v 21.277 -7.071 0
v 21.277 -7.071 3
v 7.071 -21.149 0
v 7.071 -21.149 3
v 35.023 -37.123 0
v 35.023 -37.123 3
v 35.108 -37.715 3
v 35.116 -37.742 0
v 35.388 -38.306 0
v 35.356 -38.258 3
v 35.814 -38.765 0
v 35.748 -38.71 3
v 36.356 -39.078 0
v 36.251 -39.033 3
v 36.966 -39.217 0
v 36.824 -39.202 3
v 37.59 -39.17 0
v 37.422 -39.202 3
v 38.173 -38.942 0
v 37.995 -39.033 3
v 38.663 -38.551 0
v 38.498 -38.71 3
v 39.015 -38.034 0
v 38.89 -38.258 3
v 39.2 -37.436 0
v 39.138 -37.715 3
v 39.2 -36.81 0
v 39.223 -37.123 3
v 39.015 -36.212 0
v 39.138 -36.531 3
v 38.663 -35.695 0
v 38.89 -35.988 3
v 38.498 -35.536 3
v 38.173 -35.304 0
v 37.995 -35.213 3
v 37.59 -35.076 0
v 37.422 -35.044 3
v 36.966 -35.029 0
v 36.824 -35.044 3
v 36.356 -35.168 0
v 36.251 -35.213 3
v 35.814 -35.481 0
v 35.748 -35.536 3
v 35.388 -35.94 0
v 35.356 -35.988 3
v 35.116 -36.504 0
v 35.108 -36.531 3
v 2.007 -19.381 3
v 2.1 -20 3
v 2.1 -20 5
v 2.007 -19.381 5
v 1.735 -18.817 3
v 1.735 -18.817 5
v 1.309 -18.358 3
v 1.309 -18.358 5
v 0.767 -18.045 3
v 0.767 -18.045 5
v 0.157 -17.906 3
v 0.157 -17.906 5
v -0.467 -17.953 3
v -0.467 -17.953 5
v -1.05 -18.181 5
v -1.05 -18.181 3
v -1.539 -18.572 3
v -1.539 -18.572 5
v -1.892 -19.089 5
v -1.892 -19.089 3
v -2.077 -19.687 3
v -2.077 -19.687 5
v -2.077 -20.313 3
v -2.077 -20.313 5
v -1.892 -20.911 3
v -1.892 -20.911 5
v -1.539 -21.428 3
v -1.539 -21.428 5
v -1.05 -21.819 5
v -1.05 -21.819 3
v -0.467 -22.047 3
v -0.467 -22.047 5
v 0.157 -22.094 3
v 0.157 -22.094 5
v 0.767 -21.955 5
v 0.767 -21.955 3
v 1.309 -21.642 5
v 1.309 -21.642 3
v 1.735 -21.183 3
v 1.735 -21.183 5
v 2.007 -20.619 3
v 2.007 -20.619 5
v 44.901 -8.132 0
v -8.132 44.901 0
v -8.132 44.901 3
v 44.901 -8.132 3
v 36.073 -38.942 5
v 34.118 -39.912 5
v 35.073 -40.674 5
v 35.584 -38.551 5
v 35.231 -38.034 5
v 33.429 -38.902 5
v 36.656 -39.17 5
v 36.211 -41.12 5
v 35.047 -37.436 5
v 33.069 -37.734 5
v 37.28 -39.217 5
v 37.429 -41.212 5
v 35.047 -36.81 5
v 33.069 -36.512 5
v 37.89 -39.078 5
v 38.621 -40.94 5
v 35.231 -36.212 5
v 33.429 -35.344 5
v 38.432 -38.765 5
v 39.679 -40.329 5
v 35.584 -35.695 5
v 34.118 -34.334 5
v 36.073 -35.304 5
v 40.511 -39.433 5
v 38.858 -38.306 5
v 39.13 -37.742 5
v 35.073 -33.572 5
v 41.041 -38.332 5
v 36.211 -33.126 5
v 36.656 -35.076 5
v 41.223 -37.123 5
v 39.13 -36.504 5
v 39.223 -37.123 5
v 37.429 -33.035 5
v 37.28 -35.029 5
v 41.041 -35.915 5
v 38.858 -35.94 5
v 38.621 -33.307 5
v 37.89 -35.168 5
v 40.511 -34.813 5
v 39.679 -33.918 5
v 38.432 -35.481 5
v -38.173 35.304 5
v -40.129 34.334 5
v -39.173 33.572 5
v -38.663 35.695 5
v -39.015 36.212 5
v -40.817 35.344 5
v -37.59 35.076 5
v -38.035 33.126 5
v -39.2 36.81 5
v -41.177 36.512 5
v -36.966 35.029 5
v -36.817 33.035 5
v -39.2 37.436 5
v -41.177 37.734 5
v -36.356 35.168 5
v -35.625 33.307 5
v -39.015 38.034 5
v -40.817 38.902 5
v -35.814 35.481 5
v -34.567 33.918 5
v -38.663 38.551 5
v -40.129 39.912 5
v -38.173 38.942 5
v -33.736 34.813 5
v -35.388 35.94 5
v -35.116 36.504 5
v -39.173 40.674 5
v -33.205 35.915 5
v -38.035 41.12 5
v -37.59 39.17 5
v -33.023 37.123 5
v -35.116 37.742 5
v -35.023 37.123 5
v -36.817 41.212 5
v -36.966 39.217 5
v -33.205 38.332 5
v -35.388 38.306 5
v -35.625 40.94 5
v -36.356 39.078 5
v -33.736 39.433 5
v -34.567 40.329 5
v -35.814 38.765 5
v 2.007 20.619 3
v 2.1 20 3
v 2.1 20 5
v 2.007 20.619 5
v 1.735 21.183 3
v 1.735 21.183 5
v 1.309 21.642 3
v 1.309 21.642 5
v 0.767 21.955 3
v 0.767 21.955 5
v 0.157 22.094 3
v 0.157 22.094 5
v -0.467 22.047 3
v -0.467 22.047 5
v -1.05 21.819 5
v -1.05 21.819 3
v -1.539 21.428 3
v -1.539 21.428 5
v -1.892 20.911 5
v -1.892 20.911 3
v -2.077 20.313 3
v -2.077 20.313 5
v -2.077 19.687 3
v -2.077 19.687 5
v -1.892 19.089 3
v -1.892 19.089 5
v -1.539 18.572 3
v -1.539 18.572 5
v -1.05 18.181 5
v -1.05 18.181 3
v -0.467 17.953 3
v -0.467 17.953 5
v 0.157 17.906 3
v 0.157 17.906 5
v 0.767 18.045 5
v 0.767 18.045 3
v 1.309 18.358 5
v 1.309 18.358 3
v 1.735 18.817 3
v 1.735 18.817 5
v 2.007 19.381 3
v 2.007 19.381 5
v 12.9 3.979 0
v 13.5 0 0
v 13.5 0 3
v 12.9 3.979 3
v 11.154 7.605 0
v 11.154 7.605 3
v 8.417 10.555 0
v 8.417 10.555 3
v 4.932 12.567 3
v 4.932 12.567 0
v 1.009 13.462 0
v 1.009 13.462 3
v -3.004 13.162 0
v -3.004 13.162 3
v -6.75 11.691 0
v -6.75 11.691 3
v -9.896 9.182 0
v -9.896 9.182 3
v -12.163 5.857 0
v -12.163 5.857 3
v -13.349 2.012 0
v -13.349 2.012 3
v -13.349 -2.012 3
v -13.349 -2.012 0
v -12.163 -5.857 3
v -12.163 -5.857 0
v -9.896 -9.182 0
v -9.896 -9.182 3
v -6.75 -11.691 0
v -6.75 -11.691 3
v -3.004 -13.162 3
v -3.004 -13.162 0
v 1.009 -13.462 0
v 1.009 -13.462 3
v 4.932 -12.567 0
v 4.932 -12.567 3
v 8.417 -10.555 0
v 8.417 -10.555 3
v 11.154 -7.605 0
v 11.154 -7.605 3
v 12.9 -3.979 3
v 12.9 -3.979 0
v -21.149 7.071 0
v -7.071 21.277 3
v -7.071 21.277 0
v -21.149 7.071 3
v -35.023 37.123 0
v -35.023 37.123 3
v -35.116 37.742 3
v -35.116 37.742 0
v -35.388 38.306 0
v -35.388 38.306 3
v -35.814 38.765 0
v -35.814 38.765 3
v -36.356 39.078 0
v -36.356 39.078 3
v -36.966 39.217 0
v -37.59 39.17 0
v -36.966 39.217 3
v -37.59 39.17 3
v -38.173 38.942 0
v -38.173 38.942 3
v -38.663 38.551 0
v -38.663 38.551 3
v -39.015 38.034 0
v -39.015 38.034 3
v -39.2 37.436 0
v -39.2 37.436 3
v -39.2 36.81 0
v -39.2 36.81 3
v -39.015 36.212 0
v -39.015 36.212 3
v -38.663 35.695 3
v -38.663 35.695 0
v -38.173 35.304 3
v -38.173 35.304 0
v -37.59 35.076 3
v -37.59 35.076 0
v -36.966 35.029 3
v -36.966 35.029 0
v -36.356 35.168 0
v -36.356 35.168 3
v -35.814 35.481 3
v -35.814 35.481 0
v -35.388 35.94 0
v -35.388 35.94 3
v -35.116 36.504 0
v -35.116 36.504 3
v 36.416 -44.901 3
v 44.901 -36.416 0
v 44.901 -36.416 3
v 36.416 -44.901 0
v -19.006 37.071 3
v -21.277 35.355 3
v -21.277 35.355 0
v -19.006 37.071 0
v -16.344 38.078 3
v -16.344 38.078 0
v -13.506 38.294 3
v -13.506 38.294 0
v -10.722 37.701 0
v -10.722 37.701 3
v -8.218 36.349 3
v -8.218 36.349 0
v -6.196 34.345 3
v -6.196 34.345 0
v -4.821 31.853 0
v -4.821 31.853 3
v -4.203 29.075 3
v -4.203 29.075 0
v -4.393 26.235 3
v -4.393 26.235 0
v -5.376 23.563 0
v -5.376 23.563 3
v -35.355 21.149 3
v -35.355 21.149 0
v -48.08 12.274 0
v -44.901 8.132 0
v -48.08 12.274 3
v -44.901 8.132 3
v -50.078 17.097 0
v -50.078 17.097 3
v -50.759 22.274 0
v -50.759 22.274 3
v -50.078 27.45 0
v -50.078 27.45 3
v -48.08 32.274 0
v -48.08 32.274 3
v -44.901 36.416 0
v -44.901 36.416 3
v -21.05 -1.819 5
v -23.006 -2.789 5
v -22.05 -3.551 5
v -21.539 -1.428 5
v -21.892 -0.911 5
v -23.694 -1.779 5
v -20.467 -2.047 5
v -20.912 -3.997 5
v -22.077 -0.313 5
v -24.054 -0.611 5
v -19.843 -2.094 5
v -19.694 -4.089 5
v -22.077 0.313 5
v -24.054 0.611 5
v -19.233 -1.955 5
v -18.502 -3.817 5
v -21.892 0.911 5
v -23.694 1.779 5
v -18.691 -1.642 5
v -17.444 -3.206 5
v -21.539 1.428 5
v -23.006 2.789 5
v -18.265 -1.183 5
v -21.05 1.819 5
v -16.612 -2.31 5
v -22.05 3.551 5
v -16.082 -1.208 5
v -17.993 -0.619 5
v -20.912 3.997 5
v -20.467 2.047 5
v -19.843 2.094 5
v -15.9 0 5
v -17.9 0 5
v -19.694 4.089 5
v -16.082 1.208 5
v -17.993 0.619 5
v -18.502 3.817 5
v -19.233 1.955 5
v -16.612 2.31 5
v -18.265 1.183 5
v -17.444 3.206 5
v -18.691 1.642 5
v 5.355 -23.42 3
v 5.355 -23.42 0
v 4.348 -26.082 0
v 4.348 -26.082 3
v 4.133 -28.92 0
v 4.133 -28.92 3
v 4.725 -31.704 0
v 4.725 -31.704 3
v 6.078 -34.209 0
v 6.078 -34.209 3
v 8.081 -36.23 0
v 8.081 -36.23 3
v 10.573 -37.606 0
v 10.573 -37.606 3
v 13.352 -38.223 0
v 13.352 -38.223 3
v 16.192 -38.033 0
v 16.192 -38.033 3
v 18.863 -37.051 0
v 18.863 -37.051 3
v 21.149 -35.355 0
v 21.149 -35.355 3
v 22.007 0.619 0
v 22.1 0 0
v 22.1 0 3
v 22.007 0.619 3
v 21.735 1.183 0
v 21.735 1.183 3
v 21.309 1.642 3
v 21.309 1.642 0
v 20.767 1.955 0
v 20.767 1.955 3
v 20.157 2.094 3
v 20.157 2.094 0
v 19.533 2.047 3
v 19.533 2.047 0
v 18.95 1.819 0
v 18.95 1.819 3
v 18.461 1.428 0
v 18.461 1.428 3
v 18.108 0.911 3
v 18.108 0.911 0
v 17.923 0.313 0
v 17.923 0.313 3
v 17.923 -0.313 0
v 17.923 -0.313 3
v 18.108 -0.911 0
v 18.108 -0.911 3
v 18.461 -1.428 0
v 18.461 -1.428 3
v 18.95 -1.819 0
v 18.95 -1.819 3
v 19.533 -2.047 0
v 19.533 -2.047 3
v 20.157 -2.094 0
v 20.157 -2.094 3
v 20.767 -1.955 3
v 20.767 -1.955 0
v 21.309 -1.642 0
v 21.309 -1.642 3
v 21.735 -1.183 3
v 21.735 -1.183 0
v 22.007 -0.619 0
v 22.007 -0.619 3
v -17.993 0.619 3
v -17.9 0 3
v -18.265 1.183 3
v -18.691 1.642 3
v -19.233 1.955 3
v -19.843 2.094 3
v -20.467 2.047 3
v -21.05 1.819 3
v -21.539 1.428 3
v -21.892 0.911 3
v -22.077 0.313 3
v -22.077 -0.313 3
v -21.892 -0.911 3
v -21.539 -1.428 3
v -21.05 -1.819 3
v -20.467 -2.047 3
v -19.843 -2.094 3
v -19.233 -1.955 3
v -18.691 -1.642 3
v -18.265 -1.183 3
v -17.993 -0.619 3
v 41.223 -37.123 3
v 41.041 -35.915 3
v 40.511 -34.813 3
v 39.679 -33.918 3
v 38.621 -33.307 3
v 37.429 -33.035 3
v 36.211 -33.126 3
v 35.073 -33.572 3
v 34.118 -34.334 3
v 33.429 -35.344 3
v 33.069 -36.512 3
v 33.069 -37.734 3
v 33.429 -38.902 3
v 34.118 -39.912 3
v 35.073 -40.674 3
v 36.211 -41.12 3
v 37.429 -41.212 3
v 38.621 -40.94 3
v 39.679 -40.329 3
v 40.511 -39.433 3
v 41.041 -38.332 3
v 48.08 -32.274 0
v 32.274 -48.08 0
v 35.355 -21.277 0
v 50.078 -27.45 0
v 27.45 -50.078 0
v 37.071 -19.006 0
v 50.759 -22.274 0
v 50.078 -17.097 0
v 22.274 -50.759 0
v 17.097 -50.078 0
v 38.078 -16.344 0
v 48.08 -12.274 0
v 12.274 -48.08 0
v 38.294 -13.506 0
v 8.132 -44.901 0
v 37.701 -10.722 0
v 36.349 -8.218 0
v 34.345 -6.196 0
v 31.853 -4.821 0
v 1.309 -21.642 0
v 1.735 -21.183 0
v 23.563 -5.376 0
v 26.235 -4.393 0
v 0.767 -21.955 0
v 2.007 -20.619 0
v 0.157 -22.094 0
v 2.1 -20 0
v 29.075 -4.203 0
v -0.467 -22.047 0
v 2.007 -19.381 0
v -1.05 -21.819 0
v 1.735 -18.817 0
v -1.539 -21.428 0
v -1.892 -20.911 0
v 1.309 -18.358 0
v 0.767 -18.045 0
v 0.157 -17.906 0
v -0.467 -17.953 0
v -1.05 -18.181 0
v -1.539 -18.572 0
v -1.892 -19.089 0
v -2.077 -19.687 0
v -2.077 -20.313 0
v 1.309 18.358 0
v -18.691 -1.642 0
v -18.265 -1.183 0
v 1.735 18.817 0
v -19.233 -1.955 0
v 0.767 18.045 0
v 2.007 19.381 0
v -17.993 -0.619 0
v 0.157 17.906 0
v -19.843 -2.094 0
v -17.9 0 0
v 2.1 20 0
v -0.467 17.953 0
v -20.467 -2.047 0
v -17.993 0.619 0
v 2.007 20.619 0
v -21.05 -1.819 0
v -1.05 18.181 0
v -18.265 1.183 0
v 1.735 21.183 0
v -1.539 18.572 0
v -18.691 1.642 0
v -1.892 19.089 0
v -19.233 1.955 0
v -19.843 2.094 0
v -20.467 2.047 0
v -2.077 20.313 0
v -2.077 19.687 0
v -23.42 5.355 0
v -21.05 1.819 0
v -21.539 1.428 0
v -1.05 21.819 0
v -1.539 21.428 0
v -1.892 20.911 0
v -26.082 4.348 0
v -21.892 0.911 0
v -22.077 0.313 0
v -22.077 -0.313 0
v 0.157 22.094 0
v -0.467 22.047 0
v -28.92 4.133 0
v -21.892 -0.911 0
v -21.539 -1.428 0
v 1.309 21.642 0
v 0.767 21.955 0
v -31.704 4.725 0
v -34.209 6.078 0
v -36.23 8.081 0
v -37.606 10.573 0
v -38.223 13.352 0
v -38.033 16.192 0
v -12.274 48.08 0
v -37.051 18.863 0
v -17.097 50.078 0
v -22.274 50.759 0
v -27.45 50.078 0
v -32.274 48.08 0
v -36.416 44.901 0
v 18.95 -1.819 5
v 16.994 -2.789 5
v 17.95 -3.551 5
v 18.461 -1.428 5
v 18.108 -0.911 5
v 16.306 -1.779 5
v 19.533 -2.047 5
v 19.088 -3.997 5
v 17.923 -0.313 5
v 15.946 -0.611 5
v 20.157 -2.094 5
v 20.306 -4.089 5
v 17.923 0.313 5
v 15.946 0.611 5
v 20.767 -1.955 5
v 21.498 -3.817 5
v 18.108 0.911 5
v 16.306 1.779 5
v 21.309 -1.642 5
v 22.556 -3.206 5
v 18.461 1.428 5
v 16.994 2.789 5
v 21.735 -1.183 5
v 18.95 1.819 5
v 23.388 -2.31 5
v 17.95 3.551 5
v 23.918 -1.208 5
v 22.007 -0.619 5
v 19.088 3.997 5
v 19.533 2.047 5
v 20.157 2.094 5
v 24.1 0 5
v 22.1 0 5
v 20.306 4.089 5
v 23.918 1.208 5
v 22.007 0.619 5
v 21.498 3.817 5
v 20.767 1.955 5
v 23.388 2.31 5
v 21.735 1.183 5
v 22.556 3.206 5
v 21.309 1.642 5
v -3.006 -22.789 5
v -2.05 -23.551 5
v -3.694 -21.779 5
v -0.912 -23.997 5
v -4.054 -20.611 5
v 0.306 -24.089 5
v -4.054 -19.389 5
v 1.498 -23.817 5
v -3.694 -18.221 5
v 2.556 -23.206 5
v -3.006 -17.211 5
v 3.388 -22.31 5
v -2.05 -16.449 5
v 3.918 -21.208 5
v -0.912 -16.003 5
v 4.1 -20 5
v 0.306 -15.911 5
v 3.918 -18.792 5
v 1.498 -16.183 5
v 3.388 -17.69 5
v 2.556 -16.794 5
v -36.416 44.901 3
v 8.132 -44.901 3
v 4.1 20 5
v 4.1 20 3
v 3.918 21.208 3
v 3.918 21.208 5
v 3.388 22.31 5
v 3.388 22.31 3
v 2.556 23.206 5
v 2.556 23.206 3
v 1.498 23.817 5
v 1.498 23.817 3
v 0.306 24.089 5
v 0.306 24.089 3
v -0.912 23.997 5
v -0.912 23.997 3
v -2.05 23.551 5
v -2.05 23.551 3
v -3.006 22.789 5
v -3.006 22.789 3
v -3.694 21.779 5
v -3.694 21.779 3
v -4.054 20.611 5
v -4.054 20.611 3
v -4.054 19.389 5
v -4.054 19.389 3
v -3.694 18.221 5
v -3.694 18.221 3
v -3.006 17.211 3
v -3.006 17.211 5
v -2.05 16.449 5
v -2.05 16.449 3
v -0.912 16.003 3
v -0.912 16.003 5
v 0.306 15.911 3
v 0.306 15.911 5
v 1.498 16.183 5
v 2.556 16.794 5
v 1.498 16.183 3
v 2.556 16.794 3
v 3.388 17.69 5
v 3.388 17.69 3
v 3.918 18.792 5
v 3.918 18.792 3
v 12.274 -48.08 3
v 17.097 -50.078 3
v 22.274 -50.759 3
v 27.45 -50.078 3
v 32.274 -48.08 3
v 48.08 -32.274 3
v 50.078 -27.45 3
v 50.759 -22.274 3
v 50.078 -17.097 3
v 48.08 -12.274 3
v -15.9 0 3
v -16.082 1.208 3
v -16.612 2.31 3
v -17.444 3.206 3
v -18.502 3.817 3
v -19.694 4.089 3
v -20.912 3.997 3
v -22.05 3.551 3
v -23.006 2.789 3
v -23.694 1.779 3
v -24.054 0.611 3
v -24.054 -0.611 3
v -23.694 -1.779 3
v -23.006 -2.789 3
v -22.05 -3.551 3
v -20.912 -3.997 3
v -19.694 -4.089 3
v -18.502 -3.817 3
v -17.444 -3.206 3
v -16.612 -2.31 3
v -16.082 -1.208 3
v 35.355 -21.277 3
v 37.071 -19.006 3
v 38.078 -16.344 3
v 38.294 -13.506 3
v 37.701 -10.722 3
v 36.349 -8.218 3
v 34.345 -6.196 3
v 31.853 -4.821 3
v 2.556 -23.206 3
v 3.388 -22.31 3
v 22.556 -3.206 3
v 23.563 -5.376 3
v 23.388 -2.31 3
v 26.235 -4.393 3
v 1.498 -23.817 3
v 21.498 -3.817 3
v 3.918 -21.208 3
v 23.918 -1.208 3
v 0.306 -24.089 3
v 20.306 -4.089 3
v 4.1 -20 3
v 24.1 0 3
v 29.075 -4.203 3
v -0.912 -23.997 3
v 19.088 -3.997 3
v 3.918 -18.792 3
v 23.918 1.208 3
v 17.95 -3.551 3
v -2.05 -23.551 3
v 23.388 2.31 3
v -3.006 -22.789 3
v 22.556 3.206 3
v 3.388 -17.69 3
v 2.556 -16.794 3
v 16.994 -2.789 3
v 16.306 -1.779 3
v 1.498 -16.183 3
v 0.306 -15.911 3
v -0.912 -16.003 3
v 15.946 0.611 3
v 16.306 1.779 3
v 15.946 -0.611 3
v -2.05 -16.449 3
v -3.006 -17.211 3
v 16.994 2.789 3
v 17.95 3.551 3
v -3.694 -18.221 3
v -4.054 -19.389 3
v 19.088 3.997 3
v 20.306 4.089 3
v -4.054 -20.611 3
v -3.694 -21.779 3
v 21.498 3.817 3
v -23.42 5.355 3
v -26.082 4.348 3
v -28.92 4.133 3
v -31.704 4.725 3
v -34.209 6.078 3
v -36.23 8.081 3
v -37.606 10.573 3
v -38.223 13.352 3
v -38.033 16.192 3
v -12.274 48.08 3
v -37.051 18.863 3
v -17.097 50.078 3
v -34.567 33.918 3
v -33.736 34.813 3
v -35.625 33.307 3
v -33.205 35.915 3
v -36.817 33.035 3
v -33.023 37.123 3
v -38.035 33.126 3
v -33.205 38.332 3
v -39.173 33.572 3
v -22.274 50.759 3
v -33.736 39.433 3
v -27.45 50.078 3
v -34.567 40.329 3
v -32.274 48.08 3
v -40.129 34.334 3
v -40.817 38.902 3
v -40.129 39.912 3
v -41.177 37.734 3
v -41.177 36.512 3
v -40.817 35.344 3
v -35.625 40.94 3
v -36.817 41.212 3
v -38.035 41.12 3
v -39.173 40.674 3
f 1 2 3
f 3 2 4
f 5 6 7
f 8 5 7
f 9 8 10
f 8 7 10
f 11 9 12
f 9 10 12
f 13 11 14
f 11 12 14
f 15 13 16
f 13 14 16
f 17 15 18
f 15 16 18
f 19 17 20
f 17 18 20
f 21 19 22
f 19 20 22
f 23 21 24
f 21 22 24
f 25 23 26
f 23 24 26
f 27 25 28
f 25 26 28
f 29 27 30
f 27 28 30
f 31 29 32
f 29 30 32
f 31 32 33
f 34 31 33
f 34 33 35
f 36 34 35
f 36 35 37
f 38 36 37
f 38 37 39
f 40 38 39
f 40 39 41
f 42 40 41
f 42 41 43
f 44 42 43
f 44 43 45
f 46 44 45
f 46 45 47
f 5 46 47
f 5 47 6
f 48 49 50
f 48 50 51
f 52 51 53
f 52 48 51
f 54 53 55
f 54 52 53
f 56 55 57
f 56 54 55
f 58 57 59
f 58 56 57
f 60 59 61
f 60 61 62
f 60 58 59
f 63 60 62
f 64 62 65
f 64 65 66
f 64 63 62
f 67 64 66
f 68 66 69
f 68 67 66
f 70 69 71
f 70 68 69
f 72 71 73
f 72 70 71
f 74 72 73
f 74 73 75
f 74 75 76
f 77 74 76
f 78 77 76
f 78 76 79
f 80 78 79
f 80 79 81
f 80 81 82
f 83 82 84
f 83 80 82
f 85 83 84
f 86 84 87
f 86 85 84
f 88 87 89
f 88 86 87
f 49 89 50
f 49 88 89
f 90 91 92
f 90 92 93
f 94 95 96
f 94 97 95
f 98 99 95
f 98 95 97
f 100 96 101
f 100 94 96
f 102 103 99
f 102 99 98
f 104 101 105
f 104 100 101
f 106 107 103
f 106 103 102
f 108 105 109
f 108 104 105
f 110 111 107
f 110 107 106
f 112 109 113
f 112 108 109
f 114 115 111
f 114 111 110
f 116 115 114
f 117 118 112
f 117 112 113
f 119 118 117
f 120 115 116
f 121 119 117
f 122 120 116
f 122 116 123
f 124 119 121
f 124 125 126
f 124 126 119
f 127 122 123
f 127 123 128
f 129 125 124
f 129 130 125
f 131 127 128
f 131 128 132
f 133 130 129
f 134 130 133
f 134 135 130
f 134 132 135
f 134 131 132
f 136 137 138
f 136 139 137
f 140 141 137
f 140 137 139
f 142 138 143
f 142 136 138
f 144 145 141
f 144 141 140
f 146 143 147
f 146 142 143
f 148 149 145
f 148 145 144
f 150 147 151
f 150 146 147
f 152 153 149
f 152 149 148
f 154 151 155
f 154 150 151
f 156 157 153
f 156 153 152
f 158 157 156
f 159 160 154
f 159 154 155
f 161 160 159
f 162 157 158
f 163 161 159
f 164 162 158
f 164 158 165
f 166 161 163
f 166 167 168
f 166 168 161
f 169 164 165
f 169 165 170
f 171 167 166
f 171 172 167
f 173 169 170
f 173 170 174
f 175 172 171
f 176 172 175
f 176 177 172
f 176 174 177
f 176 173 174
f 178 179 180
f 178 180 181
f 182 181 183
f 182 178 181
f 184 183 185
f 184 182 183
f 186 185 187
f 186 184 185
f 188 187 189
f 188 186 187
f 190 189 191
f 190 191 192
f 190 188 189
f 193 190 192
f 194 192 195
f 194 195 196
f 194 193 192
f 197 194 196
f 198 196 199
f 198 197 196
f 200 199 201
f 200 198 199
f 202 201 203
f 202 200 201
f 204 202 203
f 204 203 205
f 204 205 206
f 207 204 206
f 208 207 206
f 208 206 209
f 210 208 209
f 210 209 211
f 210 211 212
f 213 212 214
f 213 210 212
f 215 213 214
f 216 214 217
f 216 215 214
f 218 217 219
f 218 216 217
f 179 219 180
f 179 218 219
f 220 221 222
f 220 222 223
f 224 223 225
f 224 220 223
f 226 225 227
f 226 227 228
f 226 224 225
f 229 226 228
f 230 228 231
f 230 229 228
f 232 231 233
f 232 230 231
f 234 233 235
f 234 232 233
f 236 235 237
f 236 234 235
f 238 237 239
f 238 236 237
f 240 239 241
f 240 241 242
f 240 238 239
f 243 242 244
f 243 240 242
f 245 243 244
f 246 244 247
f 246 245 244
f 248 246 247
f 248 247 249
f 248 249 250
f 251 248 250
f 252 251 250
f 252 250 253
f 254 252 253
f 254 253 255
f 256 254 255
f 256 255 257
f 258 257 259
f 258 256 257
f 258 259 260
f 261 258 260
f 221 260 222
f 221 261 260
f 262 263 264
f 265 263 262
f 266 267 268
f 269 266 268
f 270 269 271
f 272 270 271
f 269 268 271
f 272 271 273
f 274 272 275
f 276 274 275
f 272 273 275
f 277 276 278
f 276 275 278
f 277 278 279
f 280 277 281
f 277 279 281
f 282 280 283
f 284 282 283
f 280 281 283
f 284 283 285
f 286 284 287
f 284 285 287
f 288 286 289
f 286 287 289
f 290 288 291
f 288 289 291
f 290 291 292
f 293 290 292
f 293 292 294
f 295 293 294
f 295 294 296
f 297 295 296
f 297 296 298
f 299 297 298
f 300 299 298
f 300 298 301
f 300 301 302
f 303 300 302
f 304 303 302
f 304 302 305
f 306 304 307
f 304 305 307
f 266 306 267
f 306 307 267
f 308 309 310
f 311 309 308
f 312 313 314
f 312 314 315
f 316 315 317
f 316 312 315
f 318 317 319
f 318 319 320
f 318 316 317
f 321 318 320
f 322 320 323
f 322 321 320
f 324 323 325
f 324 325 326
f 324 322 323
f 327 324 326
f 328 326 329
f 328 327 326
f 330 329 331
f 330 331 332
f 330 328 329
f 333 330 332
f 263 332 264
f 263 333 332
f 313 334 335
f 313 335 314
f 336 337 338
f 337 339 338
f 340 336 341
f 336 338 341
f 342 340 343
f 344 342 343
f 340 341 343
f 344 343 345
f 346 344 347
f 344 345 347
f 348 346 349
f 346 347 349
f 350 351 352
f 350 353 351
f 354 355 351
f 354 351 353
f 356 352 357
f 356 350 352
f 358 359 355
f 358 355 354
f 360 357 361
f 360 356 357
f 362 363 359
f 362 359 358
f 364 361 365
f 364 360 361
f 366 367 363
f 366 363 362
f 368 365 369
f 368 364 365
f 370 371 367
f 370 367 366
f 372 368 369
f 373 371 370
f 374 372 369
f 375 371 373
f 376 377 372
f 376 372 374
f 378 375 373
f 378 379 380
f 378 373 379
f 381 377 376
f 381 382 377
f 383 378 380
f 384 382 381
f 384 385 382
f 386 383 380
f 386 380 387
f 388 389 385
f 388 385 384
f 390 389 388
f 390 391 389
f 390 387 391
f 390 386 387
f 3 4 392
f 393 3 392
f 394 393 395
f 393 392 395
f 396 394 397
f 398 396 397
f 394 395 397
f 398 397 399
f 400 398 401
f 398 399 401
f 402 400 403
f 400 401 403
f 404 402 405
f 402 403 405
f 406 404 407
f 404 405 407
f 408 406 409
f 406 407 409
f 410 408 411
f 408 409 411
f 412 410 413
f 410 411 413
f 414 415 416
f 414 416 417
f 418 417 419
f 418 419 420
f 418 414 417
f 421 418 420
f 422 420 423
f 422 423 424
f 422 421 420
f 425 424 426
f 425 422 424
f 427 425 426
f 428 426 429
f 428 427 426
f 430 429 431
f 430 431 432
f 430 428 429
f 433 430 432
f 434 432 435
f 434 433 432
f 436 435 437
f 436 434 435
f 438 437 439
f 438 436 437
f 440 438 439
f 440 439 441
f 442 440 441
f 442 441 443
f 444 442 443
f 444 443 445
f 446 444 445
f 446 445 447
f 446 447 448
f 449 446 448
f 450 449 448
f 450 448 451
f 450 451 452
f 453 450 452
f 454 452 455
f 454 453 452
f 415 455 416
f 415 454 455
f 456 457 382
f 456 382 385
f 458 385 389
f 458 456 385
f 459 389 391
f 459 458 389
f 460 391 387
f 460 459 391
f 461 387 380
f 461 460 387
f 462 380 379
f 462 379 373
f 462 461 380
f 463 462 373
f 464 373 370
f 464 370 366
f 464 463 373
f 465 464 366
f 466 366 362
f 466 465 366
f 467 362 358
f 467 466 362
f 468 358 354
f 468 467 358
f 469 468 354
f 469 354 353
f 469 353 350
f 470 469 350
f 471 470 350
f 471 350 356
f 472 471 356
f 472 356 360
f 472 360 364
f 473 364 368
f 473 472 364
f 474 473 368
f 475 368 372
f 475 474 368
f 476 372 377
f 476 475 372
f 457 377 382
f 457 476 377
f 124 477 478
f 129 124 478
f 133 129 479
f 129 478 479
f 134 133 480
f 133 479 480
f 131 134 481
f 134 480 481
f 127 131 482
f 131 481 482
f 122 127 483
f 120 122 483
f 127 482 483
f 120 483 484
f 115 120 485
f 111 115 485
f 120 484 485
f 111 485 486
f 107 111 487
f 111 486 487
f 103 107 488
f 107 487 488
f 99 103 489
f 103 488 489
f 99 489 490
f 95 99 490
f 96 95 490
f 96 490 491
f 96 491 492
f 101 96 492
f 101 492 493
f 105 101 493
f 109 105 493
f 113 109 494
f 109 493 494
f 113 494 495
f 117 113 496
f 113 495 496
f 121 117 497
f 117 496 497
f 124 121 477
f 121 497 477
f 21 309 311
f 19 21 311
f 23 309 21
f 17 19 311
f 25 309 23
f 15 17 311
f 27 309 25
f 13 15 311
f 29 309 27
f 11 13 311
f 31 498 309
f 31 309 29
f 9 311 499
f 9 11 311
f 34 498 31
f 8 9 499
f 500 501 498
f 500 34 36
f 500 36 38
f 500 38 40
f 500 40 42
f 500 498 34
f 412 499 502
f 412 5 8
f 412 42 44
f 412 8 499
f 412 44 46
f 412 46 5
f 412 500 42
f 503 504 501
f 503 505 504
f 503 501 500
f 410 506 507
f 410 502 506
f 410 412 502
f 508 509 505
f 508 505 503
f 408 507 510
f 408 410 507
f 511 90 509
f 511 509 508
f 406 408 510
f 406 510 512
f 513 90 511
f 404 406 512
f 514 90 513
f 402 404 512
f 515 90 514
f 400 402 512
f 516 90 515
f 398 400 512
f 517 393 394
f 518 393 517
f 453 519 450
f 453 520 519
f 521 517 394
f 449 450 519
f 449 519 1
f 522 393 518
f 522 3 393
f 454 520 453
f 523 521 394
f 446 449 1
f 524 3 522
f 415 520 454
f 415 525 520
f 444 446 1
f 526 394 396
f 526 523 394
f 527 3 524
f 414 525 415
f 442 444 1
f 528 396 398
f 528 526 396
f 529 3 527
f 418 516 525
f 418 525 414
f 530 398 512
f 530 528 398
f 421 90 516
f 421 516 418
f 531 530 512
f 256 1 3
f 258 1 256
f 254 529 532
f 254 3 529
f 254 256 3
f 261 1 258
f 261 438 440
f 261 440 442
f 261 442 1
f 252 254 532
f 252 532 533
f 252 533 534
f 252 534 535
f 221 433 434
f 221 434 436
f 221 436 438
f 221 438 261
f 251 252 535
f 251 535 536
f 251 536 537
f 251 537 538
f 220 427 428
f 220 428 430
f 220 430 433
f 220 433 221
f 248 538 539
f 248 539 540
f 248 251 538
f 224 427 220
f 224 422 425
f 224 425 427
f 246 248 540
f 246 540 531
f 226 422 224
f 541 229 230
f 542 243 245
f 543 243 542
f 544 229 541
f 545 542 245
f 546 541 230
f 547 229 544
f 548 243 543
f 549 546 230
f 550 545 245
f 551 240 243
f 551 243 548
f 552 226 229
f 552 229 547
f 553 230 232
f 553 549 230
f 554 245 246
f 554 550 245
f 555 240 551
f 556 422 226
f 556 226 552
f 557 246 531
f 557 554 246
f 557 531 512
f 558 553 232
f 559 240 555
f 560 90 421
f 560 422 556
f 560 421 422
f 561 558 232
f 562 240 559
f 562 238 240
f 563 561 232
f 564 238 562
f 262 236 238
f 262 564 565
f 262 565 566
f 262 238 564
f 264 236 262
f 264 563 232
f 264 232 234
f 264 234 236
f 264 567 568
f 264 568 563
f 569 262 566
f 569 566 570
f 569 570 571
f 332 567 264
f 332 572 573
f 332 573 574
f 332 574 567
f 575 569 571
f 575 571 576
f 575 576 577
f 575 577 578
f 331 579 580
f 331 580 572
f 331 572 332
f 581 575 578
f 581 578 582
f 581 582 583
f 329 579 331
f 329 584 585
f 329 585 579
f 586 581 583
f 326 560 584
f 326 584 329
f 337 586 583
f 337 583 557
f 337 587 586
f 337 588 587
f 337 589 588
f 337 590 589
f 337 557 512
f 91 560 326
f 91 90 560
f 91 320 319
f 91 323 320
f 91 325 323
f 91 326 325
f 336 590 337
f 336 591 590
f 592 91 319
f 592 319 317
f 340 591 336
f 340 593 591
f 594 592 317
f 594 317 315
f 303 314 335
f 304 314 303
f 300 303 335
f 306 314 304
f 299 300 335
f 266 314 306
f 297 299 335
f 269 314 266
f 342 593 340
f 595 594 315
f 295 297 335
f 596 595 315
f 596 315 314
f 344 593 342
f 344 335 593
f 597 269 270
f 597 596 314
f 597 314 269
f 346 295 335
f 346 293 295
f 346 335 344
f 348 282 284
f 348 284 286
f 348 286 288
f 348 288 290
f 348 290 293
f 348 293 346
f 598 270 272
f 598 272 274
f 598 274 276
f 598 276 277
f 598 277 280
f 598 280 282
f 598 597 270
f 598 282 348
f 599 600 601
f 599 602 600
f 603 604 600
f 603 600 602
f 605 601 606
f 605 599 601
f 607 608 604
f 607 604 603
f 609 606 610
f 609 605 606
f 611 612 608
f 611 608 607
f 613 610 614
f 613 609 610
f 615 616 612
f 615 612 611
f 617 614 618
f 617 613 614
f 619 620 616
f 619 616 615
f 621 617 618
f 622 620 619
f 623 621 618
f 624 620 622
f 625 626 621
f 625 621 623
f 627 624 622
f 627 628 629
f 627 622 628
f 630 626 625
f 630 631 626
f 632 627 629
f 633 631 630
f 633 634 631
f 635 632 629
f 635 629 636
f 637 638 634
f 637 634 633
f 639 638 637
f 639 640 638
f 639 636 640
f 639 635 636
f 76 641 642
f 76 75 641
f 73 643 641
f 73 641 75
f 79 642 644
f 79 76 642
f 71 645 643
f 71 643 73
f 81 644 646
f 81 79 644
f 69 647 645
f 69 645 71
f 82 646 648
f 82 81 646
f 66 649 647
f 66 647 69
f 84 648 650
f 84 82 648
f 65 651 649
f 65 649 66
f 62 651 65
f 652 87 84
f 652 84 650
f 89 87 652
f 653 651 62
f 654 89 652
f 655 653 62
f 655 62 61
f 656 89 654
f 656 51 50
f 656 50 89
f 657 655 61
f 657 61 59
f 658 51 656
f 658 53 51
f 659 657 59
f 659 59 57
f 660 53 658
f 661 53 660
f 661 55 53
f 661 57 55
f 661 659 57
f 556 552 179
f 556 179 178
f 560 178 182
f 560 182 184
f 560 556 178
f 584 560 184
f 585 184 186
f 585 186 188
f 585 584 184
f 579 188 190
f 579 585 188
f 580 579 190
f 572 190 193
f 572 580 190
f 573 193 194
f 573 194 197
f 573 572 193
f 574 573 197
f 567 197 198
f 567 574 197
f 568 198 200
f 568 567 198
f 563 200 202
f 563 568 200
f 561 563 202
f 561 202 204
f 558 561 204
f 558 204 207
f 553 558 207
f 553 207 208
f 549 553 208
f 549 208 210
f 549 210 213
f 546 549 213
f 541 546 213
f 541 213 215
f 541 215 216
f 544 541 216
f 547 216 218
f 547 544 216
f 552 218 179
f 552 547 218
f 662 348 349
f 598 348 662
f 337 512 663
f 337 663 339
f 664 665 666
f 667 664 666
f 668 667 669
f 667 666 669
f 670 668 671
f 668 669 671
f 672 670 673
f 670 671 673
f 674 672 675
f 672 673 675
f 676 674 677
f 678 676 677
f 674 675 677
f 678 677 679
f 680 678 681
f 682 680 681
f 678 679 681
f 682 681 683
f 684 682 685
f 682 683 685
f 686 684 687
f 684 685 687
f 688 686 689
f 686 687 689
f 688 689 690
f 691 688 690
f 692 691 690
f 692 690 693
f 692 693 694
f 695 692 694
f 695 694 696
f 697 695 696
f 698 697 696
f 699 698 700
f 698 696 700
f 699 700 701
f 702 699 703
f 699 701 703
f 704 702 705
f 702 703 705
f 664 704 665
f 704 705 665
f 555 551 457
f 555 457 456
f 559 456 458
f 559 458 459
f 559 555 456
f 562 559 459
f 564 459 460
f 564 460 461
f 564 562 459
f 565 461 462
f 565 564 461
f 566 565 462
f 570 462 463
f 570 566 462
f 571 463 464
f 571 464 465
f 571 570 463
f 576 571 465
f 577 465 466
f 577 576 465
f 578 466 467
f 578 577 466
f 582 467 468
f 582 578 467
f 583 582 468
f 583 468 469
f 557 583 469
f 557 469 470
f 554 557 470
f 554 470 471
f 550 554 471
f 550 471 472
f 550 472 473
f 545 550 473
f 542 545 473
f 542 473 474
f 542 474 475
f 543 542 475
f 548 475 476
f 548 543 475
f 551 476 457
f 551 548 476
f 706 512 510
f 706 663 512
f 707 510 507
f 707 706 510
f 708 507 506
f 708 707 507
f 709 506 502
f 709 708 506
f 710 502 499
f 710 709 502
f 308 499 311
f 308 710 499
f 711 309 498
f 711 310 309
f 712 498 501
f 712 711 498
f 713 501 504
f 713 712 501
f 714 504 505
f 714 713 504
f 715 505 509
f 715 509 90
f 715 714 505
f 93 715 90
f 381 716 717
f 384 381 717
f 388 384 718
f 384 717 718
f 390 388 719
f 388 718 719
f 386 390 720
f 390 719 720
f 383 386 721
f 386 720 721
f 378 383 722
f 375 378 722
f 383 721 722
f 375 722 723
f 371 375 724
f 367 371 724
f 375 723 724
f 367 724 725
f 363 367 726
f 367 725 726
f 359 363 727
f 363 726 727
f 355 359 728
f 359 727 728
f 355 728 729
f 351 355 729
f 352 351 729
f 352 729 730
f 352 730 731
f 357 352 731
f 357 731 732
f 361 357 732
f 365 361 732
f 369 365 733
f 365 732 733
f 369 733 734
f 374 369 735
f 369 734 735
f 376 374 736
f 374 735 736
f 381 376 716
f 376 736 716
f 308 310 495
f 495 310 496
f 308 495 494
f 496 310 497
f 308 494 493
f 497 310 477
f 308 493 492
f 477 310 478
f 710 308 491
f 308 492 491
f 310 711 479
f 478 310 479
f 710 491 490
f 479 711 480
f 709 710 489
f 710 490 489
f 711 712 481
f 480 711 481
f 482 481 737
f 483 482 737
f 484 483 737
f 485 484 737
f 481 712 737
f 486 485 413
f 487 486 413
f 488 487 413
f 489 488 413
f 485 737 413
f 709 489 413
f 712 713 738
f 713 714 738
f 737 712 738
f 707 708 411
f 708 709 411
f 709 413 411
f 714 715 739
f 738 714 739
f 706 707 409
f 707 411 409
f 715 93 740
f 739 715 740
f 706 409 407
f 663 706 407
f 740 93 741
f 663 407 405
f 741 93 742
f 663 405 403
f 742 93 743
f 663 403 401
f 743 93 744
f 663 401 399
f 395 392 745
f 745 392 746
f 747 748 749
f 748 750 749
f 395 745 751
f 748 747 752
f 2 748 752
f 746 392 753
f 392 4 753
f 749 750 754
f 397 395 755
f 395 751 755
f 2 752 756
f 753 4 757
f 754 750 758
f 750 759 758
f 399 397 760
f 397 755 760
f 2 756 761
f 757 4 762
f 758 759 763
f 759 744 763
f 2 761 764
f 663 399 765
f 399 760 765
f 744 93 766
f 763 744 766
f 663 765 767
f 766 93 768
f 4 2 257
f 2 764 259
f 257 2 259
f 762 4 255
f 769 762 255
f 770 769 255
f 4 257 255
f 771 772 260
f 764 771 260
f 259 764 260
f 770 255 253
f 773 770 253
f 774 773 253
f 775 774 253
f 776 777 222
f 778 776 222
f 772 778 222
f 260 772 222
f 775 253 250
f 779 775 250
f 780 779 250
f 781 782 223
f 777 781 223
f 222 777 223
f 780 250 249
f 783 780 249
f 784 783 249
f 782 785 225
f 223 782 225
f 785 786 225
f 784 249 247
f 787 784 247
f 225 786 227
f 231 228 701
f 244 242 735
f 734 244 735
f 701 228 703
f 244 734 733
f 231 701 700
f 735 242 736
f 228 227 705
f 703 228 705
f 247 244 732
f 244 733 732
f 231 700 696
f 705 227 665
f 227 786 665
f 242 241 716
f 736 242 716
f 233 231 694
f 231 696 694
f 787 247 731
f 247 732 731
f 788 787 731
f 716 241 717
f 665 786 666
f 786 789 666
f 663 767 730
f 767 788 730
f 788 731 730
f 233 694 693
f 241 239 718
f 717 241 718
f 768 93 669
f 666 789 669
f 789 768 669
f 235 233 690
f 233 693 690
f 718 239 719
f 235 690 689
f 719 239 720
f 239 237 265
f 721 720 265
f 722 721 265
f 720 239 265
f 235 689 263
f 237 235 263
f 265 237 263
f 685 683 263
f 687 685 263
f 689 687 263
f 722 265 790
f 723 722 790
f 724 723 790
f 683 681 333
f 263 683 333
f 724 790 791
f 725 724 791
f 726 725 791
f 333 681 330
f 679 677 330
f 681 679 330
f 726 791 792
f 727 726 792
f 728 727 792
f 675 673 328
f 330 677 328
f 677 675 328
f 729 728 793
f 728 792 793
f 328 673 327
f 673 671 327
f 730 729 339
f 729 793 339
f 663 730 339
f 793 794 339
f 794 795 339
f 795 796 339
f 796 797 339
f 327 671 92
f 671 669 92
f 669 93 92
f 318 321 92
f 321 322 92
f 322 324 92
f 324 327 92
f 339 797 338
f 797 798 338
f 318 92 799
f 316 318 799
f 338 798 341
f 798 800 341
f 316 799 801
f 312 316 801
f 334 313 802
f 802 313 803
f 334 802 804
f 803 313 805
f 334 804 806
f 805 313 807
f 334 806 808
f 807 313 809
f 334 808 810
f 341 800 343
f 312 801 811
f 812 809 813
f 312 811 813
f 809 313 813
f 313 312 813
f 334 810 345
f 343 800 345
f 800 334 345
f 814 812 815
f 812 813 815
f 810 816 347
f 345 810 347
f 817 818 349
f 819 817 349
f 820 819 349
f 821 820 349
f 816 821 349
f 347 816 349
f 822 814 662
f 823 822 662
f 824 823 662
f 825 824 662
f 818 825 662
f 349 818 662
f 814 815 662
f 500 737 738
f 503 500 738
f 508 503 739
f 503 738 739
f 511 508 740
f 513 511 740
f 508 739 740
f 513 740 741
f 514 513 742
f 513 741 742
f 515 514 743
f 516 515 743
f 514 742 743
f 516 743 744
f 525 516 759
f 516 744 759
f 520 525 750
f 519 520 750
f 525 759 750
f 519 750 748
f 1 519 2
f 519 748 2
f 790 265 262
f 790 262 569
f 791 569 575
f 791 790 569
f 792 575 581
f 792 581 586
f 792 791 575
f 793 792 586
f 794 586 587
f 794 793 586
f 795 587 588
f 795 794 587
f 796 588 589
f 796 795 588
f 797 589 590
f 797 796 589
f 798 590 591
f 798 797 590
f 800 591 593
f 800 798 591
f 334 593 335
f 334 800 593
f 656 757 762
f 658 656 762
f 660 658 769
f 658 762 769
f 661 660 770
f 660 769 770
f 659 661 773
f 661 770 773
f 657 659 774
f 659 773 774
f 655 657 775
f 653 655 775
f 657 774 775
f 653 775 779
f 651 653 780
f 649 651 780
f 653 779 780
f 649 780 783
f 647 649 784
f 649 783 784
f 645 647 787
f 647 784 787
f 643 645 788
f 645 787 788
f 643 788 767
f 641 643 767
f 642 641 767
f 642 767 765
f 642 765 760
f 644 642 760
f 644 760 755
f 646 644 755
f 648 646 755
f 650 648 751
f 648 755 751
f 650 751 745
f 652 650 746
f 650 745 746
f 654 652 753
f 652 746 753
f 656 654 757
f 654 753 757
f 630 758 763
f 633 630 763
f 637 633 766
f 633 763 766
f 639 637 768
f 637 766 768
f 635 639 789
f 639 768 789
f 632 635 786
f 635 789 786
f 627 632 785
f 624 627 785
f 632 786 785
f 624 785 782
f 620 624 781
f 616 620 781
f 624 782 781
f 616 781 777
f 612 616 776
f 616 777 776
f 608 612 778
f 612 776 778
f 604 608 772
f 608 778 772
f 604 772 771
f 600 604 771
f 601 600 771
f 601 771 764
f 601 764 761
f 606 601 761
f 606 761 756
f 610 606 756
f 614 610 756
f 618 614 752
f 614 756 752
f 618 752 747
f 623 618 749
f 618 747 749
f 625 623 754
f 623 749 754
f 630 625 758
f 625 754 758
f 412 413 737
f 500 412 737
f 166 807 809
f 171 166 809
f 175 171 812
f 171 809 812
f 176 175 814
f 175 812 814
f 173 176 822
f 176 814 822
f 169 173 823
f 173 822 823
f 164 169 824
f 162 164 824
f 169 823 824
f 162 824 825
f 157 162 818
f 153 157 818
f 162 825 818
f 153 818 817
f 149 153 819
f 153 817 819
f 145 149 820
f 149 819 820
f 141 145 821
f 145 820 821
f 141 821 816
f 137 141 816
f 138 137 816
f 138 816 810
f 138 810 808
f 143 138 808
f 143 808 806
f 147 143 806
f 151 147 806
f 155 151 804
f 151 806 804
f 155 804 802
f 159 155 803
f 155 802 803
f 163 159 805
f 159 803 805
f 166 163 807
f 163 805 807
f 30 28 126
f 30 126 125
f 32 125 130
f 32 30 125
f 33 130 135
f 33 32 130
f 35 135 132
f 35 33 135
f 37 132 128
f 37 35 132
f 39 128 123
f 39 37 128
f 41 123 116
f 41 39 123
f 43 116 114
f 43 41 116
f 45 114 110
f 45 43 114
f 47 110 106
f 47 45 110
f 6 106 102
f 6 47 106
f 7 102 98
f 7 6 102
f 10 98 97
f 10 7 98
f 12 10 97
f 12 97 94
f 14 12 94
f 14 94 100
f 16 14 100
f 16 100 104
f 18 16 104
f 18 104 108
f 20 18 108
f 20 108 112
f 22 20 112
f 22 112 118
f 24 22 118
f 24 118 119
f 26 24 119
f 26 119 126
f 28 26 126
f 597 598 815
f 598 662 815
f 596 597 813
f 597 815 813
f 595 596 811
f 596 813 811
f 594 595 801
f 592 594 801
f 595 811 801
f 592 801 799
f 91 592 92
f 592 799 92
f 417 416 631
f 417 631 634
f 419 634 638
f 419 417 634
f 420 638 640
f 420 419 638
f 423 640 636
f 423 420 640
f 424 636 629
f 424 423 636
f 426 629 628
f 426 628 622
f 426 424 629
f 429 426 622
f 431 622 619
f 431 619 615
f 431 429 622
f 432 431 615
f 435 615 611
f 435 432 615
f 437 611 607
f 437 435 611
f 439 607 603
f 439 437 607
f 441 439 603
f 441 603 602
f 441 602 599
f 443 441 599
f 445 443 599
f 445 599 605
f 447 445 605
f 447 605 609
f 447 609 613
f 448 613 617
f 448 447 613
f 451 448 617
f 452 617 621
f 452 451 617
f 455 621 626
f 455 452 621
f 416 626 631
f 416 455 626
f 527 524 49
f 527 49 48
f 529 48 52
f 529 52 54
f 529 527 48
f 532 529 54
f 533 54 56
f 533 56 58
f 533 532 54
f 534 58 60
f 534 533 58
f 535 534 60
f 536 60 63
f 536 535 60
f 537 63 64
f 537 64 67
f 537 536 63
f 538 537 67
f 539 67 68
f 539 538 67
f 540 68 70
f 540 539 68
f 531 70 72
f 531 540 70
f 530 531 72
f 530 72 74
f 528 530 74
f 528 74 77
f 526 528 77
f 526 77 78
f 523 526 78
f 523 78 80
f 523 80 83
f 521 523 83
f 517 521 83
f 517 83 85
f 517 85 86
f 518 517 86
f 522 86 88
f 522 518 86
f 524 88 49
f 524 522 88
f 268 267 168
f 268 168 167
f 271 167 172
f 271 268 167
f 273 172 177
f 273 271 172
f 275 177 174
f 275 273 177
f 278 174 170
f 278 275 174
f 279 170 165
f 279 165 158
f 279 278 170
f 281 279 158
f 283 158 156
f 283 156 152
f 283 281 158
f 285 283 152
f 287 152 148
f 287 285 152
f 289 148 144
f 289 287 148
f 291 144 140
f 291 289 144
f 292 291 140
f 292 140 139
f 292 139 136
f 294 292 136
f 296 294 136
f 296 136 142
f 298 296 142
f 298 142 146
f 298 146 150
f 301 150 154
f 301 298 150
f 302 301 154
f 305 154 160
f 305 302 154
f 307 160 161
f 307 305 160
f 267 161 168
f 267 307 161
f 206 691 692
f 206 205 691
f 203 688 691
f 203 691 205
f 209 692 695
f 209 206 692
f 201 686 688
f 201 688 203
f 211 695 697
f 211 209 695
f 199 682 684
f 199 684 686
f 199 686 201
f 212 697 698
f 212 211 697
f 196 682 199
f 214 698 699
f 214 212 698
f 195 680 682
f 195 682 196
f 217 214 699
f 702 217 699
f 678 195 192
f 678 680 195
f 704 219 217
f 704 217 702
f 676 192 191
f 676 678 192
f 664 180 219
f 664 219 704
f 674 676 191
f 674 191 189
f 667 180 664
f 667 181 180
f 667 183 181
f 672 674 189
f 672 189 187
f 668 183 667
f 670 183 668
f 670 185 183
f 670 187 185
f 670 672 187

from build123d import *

# Parameters (mm, degrees)
ESQUISSE1_R             = 2.1
ESQUISSE1_R_2           = 13.5
BOSS_EXTRU_1_DEPTH      = 3
ESQUISSE2_R             = 2.1
ENL_V_MAT_EXTRU_1_DEPTH = 3
ESQUISSE3_R             = 4.1
ESQUISSE3_R_2           = 2.1
BOSS_EXTRU_2_DEPTH      = 2
ENL_V_MAT_EXTRU_2_DEPTH = 3
CONG_1_R                = 20


with BuildPart() as part:
    # Esquisse1 → Boss.-Extru.1 (new body)
    with BuildSketch(Plane.XY):
        Polygon((22.273863607, -59.043416229), (-59.043416229, 22.273863607), (-22.273863607, 59.043416229), (59.043416229, -22.273863607), align=None)
        with Locations((0, 20)):
            Circle(ESQUISSE1_R, mode=Mode.SUBTRACT)
        Circle(ESQUISSE1_R_2, mode=Mode.SUBTRACT)
        with Locations((20, 0)):
            Circle(ESQUISSE1_R, mode=Mode.SUBTRACT)
        with Locations((0, -20)):
            Circle(ESQUISSE1_R, mode=Mode.SUBTRACT)
        with Locations((-20, 0)):
            Circle(ESQUISSE1_R, mode=Mode.SUBTRACT)
    extrude(amount=BOSS_EXTRU_1_DEPTH)

    # Esquisse2 → Enlèv. mat.-Extru.1 (cut)
    with BuildSketch(Plane.XY.offset(3)):
        with Locations((-37.123106012, 37.123106012)):
            Circle(ESQUISSE2_R)
        with Locations((37.123106012, -37.123106012)):
            Circle(ESQUISSE2_R)
    extrude(amount=-ENL_V_MAT_EXTRU_1_DEPTH, mode=Mode.SUBTRACT)

    # Esquisse3 → Boss.-Extru.2 (add)
    # profile 1 of 6: a face of its own
    with BuildSketch(Plane.XY.offset(3)):
        with Locations((37.123106012, -37.123106012)):
            Circle(ESQUISSE3_R)
        with Locations((37.123106012, -37.123106012)):
            Circle(ESQUISSE3_R_2, mode=Mode.SUBTRACT)
    # profile 2 of 6: a face of its own
    with BuildSketch(Plane.XY.offset(3)):
        with Locations((20, 0)):
            Circle(ESQUISSE3_R)
        with Locations((20, 0)):
            Circle(ESQUISSE3_R_2, mode=Mode.SUBTRACT)
    # profile 3 of 6: a face of its own
    with BuildSketch(Plane.XY.offset(3)):
        with Locations((0, -20)):
            Circle(ESQUISSE3_R)
        with Locations((0, -20)):
            Circle(ESQUISSE3_R_2, mode=Mode.SUBTRACT)
    # profile 4 of 6: a face of its own
    with BuildSketch(Plane.XY.offset(3)):
        with Locations((-20, 0)):
            Circle(ESQUISSE3_R)
        with Locations((-20, 0)):
            Circle(ESQUISSE3_R_2, mode=Mode.SUBTRACT)
    # profile 5 of 6: a face of its own
    with BuildSketch(Plane.XY.offset(3)):
        with Locations((-37.123106012, 37.123106012)):
            Circle(ESQUISSE3_R)
        with Locations((-37.123106012, 37.123106012)):
            Circle(ESQUISSE3_R_2, mode=Mode.SUBTRACT)
    # profile 6 of 6: a face of its own
    with BuildSketch(Plane.XY.offset(3)):
        with Locations((0, 20)):
            Circle(ESQUISSE3_R)
        with Locations((0, 20)):
            Circle(ESQUISSE3_R_2, mode=Mode.SUBTRACT)
    extrude(amount=BOSS_EXTRU_2_DEPTH)

    # Esquisse4 → Enlèv. mat.-Extru.2 (cut)
    with BuildSketch(Plane.XY.offset(3)):
        with BuildLine():
            Line((-35.355194284, 21.149212527), (-21.277194344, 35.355194284))
            ThreePointArc((-21.277194344, 35.355194284), (-7.135203496, 35.419185193), (-7.071212587, 21.277194344))
            Line((-7.071212587, 21.277194344), (-21.149212527, 7.071212587))
            ThreePointArc((-21.149212527, 7.071212587), (-35.291203375, 7.007221678), (-35.355194284, 21.149212527))
        make_face()
        with BuildLine():
            Line((21.149212527, -35.355194284), (35.355194284, -21.277194344))
            ThreePointArc((35.355194284, -21.277194344), (35.419185193, -7.135203496), (21.277194344, -7.071212587))
            Line((21.277194344, -7.071212587), (7.071212587, -21.149212527))
            ThreePointArc((7.071212587, -21.149212527), (7.007221678, -35.291203375), (21.149212527, -35.355194284))
        make_face()
    extrude(amount=-ENL_V_MAT_EXTRU_2_DEPTH, mode=Mode.SUBTRACT)

    # Congé1
    cong_1_edges = [part.edges().sort_by_distance(p)[0] for p in [
        (22.273863607, -59.043416229, 1.5),
        (59.043416229, -22.273863607, 1.5),
        (-22.273863607, 59.043416229, 1.5),
        (-59.043416229, 22.273863607, 1.5),
    ]]
    fillet(cong_1_edges, radius=CONG_1_R)


solid = part.part
